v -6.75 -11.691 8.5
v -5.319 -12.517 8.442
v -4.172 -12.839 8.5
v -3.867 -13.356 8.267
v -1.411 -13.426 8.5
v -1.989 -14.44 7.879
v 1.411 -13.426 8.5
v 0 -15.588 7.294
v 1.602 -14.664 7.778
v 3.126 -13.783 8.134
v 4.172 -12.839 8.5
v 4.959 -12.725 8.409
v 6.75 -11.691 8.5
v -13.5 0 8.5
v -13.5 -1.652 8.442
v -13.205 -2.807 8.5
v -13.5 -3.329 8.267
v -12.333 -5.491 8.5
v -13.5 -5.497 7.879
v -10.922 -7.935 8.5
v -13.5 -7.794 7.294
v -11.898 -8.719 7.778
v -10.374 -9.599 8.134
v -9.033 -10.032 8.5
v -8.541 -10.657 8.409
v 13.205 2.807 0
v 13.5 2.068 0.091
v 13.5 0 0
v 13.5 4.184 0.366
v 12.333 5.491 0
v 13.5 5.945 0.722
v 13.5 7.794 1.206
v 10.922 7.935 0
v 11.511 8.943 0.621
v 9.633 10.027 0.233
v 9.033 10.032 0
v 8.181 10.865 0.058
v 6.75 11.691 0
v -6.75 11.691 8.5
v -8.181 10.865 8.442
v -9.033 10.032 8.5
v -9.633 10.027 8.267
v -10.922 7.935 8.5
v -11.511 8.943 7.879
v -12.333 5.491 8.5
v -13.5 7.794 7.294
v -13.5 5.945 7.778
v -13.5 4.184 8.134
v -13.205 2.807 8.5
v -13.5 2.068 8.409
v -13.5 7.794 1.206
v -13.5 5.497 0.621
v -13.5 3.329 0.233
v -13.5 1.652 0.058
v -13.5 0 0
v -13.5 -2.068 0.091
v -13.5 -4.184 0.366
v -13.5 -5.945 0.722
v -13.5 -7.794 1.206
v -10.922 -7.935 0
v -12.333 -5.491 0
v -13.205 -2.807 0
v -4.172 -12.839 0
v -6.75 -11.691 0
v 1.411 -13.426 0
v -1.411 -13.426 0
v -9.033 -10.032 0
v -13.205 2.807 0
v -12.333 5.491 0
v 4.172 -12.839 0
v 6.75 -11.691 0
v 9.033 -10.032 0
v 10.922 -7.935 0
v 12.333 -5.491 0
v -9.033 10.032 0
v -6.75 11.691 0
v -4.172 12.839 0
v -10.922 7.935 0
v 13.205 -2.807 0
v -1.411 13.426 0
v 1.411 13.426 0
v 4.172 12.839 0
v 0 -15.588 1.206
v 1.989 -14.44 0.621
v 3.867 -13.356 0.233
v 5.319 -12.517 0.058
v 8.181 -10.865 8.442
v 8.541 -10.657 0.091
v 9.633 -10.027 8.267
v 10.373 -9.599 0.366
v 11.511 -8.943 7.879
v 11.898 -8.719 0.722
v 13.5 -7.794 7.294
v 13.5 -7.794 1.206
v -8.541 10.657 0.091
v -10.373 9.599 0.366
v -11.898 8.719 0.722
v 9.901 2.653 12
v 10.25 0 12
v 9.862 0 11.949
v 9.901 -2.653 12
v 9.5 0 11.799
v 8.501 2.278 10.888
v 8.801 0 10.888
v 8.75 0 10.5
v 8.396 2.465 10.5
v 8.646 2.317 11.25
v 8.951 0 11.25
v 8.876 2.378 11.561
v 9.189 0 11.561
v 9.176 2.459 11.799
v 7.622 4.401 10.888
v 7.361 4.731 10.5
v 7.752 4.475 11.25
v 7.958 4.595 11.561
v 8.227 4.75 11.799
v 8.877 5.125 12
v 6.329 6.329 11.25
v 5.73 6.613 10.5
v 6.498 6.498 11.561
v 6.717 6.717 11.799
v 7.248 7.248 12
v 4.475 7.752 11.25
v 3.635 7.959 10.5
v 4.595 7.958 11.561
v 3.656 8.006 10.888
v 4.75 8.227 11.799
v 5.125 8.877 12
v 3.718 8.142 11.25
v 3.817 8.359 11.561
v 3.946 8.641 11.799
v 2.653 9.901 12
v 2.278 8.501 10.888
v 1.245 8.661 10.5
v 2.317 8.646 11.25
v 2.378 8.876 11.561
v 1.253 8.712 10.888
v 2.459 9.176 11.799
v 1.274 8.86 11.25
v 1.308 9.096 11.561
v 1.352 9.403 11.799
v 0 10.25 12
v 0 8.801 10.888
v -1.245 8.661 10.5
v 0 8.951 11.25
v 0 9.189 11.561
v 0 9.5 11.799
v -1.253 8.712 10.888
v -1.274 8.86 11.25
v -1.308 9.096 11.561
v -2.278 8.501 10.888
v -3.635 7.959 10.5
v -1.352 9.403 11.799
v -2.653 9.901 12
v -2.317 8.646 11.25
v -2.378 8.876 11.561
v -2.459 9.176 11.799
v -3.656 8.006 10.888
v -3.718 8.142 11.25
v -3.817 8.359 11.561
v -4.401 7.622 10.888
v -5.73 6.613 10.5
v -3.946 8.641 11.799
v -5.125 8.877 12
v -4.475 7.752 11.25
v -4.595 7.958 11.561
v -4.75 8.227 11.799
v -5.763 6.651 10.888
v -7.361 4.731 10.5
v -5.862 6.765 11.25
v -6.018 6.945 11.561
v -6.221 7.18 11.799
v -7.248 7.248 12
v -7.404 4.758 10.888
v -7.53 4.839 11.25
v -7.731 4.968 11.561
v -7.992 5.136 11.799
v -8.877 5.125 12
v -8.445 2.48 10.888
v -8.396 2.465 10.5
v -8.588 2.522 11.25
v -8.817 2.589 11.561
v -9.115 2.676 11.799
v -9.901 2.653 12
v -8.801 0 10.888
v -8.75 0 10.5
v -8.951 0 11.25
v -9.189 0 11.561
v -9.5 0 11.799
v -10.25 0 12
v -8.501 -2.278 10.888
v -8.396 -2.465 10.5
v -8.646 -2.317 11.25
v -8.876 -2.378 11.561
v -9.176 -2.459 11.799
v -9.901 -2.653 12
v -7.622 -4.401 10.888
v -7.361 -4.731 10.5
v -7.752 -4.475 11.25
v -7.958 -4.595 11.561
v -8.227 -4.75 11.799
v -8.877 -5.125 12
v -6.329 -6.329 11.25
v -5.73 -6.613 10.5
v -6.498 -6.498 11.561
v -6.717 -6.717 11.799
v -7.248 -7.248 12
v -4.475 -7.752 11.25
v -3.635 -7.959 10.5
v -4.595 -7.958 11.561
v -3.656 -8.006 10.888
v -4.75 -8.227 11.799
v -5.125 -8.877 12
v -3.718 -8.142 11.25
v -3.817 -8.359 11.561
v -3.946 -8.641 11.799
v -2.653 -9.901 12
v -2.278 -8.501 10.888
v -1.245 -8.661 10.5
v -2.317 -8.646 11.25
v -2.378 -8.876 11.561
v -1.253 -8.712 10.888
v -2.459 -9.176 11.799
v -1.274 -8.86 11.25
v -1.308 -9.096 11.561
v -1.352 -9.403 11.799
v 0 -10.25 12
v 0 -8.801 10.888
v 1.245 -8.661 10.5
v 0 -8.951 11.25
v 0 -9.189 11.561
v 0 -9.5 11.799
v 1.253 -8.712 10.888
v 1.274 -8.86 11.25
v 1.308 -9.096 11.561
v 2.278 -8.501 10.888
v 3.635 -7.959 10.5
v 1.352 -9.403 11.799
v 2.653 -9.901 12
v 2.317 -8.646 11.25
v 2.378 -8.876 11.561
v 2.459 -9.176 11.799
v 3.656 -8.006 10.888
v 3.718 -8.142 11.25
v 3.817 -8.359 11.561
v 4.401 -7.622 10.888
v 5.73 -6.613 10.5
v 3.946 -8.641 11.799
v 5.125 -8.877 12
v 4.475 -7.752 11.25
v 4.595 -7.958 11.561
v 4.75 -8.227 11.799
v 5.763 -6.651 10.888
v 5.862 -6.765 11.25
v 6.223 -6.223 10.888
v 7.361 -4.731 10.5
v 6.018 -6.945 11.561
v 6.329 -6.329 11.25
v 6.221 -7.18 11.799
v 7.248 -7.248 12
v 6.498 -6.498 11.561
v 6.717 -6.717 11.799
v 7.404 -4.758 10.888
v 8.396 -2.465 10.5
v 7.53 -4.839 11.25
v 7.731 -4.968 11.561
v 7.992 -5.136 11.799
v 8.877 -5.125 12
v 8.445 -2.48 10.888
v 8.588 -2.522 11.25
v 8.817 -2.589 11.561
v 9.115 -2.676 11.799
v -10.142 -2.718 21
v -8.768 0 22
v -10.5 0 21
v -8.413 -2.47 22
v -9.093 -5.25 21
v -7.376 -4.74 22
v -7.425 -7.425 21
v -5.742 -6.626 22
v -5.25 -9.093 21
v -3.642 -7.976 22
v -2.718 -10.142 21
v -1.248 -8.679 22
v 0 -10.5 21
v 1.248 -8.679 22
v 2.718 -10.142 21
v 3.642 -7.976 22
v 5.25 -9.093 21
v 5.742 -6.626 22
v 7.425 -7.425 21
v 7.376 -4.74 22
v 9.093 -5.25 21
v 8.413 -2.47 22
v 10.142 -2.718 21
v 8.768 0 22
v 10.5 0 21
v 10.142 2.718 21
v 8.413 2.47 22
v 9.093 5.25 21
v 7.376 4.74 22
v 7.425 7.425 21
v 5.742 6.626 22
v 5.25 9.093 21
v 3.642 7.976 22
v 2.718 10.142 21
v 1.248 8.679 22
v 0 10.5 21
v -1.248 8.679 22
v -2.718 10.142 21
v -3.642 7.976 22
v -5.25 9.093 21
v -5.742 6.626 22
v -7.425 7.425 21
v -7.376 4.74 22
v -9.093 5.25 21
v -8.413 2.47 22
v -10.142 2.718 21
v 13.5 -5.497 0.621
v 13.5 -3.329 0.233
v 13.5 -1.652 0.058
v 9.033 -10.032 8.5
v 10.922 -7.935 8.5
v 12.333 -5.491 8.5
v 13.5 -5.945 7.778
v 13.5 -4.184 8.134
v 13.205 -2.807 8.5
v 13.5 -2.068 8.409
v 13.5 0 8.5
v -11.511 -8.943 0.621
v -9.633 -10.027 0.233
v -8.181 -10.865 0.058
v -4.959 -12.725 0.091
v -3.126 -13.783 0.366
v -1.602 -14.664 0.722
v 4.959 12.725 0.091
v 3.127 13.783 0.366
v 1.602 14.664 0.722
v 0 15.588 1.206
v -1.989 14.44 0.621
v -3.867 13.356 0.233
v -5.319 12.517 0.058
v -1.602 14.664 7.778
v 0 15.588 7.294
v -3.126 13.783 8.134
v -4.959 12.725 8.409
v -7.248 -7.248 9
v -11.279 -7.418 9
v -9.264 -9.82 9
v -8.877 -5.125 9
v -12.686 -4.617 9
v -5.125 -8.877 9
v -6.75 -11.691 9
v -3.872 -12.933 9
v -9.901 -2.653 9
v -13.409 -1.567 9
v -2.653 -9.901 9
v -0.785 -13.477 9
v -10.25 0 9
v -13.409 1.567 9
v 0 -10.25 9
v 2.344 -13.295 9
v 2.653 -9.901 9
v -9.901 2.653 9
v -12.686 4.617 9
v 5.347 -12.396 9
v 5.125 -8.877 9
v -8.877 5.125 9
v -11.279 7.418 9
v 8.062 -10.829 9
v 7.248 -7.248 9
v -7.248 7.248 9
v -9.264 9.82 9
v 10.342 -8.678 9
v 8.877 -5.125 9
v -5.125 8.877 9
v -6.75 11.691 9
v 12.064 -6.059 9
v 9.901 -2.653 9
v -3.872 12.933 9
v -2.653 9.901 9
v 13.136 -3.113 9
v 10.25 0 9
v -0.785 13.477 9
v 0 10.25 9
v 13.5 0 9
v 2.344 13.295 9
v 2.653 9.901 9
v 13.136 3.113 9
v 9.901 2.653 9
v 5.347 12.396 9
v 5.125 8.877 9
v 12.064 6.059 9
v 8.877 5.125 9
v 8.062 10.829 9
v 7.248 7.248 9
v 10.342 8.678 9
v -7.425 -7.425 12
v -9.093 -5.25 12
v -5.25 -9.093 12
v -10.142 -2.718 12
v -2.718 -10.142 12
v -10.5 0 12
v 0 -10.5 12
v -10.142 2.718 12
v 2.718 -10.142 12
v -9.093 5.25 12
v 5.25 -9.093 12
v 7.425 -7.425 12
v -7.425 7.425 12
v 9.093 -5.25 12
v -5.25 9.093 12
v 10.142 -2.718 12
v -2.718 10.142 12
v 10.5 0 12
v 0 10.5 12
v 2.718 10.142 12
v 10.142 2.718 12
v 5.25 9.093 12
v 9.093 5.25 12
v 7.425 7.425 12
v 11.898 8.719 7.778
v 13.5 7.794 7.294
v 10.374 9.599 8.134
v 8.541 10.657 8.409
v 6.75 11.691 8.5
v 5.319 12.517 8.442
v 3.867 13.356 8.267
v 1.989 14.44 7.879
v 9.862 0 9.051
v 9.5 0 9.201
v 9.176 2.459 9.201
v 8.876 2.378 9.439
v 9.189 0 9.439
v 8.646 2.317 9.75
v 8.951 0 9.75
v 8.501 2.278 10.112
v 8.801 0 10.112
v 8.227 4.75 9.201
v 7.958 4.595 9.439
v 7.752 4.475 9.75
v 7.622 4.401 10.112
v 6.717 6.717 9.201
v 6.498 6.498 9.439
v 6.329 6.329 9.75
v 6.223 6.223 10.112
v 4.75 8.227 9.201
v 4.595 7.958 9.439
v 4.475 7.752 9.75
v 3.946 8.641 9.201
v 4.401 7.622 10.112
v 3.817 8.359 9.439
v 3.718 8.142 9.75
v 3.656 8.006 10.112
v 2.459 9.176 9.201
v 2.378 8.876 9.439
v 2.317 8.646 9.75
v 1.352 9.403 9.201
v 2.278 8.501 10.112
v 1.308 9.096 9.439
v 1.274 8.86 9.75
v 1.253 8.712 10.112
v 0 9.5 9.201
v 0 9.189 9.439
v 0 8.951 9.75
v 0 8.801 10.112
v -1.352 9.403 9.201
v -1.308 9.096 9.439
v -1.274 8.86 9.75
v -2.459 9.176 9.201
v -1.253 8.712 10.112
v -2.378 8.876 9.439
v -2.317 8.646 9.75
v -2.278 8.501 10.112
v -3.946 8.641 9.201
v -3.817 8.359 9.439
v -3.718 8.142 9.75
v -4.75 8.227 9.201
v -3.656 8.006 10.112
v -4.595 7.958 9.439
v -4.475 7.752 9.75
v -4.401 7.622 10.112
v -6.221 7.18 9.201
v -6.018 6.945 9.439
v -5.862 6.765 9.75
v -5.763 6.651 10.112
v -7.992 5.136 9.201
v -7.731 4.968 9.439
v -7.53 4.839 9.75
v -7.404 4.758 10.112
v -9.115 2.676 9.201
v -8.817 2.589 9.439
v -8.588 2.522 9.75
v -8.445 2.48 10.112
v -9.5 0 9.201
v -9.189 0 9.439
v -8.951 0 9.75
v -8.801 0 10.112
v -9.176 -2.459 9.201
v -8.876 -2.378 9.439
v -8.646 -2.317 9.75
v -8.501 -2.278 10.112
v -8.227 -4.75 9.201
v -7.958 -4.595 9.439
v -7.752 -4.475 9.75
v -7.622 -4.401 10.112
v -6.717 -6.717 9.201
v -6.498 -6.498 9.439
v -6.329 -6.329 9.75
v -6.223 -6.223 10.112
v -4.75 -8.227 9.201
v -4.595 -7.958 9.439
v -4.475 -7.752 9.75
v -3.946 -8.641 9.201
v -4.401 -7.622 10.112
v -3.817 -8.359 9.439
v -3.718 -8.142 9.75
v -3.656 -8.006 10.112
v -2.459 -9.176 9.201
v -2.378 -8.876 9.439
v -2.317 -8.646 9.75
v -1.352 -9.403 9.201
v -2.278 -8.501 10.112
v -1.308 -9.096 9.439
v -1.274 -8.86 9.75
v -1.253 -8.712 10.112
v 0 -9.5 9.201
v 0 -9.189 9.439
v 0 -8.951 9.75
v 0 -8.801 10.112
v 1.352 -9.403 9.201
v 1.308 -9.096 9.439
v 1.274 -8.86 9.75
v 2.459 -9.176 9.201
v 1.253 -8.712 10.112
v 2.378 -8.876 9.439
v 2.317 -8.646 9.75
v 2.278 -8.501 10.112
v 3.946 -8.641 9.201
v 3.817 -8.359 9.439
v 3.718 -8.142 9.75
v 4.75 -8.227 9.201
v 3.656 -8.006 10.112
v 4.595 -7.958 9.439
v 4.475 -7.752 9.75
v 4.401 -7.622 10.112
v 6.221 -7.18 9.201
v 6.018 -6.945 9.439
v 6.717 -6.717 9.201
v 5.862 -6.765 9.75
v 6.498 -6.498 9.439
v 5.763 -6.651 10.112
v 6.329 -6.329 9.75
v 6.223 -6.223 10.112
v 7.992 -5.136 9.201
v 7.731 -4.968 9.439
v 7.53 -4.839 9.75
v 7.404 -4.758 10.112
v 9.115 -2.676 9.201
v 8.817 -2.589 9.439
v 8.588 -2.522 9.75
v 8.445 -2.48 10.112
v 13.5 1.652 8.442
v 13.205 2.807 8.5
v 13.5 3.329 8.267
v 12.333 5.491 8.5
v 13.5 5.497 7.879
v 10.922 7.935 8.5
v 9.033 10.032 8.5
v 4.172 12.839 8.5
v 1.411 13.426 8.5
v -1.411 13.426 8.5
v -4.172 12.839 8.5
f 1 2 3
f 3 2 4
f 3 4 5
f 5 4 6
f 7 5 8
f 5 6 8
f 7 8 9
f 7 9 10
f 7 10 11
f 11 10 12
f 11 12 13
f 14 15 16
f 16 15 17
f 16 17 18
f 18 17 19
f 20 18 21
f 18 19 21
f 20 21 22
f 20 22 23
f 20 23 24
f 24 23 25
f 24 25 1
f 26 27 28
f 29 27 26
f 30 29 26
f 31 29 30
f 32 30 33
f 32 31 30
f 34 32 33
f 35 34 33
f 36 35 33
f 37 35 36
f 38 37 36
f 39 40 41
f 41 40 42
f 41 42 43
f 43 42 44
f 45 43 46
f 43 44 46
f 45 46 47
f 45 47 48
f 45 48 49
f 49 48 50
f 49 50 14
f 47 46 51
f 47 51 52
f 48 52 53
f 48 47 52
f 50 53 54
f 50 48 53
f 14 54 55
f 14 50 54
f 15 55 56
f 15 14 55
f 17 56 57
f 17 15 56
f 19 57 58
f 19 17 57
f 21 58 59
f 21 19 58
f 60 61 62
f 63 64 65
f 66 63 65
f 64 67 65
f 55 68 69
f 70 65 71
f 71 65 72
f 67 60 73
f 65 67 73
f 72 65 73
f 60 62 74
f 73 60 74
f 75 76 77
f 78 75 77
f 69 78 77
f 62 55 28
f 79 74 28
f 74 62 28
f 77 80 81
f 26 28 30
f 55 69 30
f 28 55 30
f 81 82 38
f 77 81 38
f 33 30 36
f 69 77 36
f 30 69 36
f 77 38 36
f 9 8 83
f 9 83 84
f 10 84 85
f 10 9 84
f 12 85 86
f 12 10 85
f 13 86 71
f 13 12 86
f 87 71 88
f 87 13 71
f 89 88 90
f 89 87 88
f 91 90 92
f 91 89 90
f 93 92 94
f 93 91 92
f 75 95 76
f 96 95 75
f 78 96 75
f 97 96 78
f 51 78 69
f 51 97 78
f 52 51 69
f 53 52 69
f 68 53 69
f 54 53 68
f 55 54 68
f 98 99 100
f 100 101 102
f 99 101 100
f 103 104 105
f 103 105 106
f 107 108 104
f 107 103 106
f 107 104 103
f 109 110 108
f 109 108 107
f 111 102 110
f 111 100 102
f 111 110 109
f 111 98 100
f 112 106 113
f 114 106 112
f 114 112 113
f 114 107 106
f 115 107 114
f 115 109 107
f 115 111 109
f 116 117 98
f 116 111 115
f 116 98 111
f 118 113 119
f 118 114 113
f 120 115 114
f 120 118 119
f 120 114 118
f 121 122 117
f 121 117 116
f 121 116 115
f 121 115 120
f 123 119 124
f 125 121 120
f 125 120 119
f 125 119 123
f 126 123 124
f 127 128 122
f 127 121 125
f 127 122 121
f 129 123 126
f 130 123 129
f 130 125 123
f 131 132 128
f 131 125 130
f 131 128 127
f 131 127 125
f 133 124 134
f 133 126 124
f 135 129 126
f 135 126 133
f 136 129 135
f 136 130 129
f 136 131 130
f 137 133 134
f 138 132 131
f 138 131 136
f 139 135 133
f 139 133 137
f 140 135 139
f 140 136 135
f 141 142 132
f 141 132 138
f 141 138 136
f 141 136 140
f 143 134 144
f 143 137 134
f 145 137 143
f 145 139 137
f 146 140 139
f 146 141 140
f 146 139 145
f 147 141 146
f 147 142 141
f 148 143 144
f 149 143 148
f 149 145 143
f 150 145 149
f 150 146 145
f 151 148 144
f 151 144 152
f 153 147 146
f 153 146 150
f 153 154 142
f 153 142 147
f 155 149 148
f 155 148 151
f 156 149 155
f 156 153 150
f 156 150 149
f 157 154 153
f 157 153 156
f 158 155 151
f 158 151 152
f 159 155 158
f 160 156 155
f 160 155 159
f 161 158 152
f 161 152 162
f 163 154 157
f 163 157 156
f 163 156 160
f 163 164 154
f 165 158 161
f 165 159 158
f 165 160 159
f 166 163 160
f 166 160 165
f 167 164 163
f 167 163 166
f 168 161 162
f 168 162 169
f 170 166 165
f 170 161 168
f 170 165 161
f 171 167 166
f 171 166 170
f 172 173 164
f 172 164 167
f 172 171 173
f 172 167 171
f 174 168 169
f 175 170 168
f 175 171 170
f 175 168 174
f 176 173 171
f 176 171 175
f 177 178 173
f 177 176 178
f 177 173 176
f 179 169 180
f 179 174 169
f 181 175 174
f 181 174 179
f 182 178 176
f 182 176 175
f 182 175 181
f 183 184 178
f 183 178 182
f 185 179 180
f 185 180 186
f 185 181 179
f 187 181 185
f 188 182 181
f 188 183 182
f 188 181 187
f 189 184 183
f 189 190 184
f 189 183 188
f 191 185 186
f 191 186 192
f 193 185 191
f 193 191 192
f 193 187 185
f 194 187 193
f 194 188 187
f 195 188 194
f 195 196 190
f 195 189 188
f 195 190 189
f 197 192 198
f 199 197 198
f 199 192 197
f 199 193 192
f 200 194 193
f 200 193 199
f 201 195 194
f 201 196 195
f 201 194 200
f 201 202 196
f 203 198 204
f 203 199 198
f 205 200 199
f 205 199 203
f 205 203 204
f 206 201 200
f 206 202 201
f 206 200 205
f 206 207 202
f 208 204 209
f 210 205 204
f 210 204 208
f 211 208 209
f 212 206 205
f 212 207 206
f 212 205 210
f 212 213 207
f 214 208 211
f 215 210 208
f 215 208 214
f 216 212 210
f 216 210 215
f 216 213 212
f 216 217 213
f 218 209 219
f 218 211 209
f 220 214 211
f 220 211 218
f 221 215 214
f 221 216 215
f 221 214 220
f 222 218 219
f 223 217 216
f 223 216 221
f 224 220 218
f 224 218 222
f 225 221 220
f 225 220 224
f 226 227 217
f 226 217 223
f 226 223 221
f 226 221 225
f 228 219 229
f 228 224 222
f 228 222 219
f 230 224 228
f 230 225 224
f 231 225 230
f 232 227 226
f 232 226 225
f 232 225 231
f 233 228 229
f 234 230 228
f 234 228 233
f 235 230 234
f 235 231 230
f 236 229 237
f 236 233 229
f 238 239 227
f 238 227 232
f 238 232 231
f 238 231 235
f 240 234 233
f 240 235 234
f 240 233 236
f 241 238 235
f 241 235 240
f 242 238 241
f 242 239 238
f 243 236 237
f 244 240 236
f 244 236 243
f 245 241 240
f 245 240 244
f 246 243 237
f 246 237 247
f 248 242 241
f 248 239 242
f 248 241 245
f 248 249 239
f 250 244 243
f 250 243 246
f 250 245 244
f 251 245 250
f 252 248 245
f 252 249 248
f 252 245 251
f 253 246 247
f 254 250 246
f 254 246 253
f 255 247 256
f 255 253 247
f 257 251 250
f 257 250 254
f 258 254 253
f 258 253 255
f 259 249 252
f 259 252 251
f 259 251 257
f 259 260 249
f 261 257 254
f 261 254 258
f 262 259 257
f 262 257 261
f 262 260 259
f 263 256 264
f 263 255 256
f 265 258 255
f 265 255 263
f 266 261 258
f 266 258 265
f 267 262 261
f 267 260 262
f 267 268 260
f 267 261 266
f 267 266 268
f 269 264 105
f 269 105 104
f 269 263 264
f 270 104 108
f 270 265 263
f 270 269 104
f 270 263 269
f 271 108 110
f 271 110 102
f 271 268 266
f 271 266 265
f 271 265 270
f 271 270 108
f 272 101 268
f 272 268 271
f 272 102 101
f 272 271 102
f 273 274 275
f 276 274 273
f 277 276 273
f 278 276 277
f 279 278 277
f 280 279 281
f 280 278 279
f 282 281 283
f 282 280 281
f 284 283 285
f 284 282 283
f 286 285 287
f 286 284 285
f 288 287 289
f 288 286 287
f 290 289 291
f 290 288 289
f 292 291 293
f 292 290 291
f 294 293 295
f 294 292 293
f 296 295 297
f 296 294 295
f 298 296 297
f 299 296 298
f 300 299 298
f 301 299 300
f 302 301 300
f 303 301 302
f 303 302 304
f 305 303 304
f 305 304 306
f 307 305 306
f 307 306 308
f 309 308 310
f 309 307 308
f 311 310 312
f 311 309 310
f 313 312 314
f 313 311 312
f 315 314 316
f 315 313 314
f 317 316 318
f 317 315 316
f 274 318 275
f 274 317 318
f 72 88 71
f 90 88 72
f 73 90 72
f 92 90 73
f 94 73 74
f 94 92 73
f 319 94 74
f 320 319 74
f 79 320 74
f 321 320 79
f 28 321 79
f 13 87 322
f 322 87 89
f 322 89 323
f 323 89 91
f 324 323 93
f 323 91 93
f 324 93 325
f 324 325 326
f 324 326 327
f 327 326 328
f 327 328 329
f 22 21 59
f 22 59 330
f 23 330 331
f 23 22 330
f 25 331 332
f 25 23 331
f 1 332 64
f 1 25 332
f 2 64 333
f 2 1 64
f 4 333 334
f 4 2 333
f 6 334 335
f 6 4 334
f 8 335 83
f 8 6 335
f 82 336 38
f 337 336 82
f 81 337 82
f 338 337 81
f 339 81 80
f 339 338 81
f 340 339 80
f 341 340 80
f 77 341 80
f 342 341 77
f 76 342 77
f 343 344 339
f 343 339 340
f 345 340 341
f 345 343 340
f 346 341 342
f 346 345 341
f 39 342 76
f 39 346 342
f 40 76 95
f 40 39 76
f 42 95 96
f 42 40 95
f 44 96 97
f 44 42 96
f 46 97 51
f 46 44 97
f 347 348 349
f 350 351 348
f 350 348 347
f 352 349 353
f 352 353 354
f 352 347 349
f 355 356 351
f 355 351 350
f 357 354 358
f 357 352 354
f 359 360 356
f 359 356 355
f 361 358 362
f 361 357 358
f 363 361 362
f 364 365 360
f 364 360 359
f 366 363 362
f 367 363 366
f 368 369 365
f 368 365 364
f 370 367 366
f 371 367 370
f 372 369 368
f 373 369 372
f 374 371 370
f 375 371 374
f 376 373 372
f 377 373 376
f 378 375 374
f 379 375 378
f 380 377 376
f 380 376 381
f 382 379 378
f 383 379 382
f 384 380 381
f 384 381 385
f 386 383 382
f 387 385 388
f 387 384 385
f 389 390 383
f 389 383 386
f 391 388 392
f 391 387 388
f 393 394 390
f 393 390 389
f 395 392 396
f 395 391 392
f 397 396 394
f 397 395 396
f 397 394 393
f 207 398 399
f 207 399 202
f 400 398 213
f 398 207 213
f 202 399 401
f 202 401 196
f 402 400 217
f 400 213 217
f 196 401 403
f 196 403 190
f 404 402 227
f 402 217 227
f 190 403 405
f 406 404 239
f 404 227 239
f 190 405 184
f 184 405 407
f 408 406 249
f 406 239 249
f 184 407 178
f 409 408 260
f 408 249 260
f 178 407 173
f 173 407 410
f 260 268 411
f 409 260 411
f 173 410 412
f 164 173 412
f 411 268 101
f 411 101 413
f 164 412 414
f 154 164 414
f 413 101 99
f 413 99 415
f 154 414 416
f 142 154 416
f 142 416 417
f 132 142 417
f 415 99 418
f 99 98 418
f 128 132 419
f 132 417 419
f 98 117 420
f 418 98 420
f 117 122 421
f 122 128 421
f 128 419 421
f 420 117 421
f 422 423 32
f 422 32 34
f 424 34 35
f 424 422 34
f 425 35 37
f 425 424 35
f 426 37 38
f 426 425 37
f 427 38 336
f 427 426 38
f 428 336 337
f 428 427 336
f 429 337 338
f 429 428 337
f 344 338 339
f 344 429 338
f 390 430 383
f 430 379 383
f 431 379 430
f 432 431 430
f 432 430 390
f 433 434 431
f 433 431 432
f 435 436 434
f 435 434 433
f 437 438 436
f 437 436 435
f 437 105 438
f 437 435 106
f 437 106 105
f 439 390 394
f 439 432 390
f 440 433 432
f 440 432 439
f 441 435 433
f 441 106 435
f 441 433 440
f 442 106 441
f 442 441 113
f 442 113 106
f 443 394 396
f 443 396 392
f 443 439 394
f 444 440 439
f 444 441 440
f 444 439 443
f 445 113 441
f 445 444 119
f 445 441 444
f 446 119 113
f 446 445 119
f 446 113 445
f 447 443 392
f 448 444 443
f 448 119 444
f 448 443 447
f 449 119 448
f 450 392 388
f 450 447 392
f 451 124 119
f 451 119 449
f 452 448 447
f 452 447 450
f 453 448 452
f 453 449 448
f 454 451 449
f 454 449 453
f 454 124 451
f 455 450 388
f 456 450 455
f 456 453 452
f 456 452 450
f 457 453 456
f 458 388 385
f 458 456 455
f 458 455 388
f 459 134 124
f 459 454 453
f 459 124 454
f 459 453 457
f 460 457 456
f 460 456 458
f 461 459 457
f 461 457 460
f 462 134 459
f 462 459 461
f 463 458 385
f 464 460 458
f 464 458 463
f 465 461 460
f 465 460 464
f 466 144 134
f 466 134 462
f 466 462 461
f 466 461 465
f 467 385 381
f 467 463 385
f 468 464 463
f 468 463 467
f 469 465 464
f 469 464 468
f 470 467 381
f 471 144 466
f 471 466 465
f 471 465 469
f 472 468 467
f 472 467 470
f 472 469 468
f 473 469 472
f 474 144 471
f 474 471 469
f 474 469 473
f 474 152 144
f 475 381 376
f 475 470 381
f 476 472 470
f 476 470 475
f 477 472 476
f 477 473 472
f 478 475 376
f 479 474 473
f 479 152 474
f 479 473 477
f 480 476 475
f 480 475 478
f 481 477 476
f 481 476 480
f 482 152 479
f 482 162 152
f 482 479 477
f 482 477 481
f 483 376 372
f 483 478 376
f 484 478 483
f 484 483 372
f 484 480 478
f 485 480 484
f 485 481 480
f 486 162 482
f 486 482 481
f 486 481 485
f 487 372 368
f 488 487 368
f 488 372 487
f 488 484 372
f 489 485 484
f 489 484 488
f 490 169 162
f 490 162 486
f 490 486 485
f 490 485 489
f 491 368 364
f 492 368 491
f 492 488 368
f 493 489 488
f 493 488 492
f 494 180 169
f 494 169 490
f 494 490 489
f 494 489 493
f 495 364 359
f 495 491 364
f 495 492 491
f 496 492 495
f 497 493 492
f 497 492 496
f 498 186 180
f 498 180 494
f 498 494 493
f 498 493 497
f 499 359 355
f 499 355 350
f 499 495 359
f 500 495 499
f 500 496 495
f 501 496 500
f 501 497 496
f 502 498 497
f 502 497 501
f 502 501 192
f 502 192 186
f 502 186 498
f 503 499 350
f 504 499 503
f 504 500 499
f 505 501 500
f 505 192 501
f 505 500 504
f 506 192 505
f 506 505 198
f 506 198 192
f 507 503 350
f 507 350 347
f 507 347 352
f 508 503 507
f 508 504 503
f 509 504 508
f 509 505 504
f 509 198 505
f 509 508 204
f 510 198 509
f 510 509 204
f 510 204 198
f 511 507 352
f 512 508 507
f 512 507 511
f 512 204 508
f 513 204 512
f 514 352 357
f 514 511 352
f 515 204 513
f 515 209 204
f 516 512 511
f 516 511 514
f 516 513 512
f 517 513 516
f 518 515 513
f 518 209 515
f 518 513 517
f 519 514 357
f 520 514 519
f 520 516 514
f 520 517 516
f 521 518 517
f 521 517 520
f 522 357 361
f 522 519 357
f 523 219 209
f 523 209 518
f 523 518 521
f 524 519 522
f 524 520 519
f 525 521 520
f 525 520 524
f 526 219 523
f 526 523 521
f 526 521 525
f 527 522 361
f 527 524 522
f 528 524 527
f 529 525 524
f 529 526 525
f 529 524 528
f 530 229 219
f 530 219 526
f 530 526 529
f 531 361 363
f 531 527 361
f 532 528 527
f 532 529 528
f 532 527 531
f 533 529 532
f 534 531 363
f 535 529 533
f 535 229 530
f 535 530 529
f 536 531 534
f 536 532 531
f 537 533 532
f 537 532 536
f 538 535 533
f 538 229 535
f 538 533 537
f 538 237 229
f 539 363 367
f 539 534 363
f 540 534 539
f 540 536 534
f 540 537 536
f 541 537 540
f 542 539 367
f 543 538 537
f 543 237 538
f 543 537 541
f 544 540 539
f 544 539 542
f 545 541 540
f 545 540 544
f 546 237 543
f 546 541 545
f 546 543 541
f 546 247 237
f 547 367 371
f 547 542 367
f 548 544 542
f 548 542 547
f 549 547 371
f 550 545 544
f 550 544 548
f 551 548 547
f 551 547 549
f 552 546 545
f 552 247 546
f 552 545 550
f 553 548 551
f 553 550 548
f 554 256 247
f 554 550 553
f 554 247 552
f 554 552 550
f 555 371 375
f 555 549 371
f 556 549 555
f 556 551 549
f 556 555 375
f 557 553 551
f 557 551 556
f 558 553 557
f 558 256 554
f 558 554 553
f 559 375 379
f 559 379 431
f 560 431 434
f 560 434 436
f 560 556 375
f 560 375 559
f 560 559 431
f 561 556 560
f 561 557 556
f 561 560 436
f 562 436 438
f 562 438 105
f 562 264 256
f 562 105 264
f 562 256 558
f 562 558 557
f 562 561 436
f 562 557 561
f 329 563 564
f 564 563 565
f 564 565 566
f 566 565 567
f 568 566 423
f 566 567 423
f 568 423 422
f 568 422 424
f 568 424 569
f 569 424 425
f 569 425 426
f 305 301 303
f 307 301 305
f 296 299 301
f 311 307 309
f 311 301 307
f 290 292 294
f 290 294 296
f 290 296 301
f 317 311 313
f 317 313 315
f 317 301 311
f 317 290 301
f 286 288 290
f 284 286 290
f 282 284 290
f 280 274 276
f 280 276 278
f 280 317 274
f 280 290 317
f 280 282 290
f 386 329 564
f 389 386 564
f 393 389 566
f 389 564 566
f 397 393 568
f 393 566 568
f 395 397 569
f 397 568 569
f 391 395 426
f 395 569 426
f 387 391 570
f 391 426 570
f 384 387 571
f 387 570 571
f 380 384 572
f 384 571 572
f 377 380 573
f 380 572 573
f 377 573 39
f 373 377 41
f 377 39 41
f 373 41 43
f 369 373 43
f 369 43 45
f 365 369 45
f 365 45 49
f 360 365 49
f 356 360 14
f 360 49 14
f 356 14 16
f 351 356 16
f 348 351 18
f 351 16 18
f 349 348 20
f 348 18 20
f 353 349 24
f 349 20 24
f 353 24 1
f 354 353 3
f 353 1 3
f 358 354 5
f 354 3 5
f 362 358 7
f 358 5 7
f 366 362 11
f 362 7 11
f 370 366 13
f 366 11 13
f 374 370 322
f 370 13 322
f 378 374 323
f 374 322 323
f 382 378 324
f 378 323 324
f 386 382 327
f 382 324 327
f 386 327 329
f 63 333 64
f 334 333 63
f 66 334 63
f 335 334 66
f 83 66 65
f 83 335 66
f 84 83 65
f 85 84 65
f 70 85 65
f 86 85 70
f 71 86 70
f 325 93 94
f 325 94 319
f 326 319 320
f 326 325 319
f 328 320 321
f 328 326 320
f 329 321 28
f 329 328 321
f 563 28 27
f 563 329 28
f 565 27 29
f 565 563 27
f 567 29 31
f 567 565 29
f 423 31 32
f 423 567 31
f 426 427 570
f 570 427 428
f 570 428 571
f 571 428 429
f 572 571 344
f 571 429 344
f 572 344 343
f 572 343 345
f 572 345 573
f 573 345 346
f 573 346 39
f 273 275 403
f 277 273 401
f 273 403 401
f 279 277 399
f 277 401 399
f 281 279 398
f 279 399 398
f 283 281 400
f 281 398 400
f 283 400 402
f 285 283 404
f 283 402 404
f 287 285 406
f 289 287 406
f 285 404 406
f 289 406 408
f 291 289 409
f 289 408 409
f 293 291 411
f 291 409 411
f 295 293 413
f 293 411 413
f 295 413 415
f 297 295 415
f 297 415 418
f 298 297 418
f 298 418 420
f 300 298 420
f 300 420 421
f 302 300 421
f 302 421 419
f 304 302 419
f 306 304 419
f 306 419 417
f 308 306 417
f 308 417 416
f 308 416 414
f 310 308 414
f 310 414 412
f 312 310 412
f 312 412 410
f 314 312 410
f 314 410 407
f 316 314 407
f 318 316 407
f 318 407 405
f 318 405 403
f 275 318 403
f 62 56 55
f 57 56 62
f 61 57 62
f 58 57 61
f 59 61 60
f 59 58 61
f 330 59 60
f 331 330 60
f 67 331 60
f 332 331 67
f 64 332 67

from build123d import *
from OCP.BRepFilletAPI import BRepFilletAPI_MakeChamfer

# Parameters (mm, degrees)
ESQUISSE1_R             = 16
BASE_EXTRUSION_DEPTH    = 8.5
CHANFREIN1_SIZE         = 2.5
CHANFREIN1_SIZE2        = 1.443375673
ESQUISSE2_OUTSIDE_W     = 43.21
ESQUISSE2_OUTSIDE_H     = 43.21
ENL_V_MAT_EXTRU_1_DEPTH = 25.171263931
ESQUISSE3_R             = 13.5
BOSS_EXTRU_1_DEPTH      = 0.5
ESQUISSE4_R             = 10.5
BOSS_EXTRU_2_DEPTH      = 13
CHANFREIN2_SIZE         = 1
CHANFREIN2_SIZE2        = 1.732050808
ESQUISSE5_OUTSIDE_W     = 38.348
ESQUISSE5_OUTSIDE_H     = 42.524
ESQUISSE5_OUTSIDE_R     = 8.75
ENL_V_MAT_EXTRU_2_DEPTH = 3
CONG_1_R                = 1.5


with BuildPart() as part:
    # Esquisse1 → Base-Extrusion (new body)
    with BuildSketch(Plane.XY):
        Circle(ESQUISSE1_R)
    extrude(amount=BASE_EXTRUSION_DEPTH)

    # Chanfrein1: one chamfer whose edges measure the first distance from different faces: ONE call of the kernel's chamfer builder (chamfer() names one face for all edges)
    chanfrein1_edges_1 = [part.edges().sort_by_distance(p)[0] for p in [
        (-16, 0, 0),
    ]]
    chanfrein1_side_1 = [part.faces().sort_by_distance(p)[0] for p in [
        (0, 0, 0),
    ]]
    chanfrein1_edges_2 = [part.edges().sort_by_distance(p)[0] for p in [
        (-16, 0, 8.5),
    ]]
    chanfrein1_side_2 = [part.faces().sort_by_distance(p)[0] for p in [
        (0, 0, 8.5),
    ]]
    chanfrein1 = BRepFilletAPI_MakeChamfer(part.part.solid().wrapped)
    for e in chanfrein1_edges_1:
        chanfrein1.Add(CHANFREIN1_SIZE, CHANFREIN1_SIZE2, e.wrapped, chanfrein1_side_1[0].wrapped)  # the first distance lies on this face
    for e in chanfrein1_edges_2:
        chanfrein1.Add(CHANFREIN1_SIZE, CHANFREIN1_SIZE2, e.wrapped, chanfrein1_side_2[0].wrapped)  # the first distance lies on this face
    add(Compound.cast(chanfrein1.Shape()), mode=Mode.REPLACE)

    # Esquisse2 outside → Enlèv. mat.-Extru.1 (cut, through all)
    with BuildSketch(Plane.XY.offset(8.5)):
        Rectangle(ESQUISSE2_OUTSIDE_W, ESQUISSE2_OUTSIDE_H)
        Polygon((13.5, -7.794228634), (13.5, 7.794228634), (0, 15.588457268), (-13.5, 7.794228634), (-13.5, -7.794228634), (0, -15.588457268), align=None, mode=Mode.SUBTRACT)
    extrude(amount=-ENL_V_MAT_EXTRU_1_DEPTH, mode=Mode.SUBTRACT)

    # Esquisse3 → Boss.-Extru.1 (add)
    with BuildSketch(Plane.XY.offset(8.5)):
        Circle(ESQUISSE3_R)
    extrude(amount=BOSS_EXTRU_1_DEPTH)

    # Esquisse4 → Boss.-Extru.2 (add)
    with BuildSketch(Plane.XY.offset(9)):
        with Locations(Location((0, 0, 0), (0, 0, 180))):
            Circle(ESQUISSE4_R)
    extrude(amount=BOSS_EXTRU_2_DEPTH)

    # Chanfrein2
    chanfrein2_edges = [part.edges().sort_by_distance(p)[0] for p in [
        (10.5, 0, 22),
    ]]
    chanfrein2_side = [part.faces().sort_by_distance(p)[0] for p in [
        (10.5, 0, 15.5),
    ]]
    chamfer(chanfrein2_edges, length=CHANFREIN2_SIZE, length2=CHANFREIN2_SIZE2, reference=chanfrein2_side[0])

    # Esquisse5 outside → Enlèv. mat.-Extru.2 (cut)
    with BuildSketch(Plane.XY.offset(9)):
        Rectangle(ESQUISSE5_OUTSIDE_W, ESQUISSE5_OUTSIDE_H)
        Circle(ESQUISSE5_OUTSIDE_R, mode=Mode.SUBTRACT)
    extrude(amount=ENL_V_MAT_EXTRU_2_DEPTH, mode=Mode.SUBTRACT)

    # Congé1
    cong_1_edges = [part.edges().sort_by_distance(p)[0] for p in [
        (-8.75, 0, 9),
        (-8.75, 0, 12),
    ]]
    fillet(cong_1_edges, radius=CONG_1_R - 0.0001)  # a hair under: the kernel refuses the full size


solid = part.part
